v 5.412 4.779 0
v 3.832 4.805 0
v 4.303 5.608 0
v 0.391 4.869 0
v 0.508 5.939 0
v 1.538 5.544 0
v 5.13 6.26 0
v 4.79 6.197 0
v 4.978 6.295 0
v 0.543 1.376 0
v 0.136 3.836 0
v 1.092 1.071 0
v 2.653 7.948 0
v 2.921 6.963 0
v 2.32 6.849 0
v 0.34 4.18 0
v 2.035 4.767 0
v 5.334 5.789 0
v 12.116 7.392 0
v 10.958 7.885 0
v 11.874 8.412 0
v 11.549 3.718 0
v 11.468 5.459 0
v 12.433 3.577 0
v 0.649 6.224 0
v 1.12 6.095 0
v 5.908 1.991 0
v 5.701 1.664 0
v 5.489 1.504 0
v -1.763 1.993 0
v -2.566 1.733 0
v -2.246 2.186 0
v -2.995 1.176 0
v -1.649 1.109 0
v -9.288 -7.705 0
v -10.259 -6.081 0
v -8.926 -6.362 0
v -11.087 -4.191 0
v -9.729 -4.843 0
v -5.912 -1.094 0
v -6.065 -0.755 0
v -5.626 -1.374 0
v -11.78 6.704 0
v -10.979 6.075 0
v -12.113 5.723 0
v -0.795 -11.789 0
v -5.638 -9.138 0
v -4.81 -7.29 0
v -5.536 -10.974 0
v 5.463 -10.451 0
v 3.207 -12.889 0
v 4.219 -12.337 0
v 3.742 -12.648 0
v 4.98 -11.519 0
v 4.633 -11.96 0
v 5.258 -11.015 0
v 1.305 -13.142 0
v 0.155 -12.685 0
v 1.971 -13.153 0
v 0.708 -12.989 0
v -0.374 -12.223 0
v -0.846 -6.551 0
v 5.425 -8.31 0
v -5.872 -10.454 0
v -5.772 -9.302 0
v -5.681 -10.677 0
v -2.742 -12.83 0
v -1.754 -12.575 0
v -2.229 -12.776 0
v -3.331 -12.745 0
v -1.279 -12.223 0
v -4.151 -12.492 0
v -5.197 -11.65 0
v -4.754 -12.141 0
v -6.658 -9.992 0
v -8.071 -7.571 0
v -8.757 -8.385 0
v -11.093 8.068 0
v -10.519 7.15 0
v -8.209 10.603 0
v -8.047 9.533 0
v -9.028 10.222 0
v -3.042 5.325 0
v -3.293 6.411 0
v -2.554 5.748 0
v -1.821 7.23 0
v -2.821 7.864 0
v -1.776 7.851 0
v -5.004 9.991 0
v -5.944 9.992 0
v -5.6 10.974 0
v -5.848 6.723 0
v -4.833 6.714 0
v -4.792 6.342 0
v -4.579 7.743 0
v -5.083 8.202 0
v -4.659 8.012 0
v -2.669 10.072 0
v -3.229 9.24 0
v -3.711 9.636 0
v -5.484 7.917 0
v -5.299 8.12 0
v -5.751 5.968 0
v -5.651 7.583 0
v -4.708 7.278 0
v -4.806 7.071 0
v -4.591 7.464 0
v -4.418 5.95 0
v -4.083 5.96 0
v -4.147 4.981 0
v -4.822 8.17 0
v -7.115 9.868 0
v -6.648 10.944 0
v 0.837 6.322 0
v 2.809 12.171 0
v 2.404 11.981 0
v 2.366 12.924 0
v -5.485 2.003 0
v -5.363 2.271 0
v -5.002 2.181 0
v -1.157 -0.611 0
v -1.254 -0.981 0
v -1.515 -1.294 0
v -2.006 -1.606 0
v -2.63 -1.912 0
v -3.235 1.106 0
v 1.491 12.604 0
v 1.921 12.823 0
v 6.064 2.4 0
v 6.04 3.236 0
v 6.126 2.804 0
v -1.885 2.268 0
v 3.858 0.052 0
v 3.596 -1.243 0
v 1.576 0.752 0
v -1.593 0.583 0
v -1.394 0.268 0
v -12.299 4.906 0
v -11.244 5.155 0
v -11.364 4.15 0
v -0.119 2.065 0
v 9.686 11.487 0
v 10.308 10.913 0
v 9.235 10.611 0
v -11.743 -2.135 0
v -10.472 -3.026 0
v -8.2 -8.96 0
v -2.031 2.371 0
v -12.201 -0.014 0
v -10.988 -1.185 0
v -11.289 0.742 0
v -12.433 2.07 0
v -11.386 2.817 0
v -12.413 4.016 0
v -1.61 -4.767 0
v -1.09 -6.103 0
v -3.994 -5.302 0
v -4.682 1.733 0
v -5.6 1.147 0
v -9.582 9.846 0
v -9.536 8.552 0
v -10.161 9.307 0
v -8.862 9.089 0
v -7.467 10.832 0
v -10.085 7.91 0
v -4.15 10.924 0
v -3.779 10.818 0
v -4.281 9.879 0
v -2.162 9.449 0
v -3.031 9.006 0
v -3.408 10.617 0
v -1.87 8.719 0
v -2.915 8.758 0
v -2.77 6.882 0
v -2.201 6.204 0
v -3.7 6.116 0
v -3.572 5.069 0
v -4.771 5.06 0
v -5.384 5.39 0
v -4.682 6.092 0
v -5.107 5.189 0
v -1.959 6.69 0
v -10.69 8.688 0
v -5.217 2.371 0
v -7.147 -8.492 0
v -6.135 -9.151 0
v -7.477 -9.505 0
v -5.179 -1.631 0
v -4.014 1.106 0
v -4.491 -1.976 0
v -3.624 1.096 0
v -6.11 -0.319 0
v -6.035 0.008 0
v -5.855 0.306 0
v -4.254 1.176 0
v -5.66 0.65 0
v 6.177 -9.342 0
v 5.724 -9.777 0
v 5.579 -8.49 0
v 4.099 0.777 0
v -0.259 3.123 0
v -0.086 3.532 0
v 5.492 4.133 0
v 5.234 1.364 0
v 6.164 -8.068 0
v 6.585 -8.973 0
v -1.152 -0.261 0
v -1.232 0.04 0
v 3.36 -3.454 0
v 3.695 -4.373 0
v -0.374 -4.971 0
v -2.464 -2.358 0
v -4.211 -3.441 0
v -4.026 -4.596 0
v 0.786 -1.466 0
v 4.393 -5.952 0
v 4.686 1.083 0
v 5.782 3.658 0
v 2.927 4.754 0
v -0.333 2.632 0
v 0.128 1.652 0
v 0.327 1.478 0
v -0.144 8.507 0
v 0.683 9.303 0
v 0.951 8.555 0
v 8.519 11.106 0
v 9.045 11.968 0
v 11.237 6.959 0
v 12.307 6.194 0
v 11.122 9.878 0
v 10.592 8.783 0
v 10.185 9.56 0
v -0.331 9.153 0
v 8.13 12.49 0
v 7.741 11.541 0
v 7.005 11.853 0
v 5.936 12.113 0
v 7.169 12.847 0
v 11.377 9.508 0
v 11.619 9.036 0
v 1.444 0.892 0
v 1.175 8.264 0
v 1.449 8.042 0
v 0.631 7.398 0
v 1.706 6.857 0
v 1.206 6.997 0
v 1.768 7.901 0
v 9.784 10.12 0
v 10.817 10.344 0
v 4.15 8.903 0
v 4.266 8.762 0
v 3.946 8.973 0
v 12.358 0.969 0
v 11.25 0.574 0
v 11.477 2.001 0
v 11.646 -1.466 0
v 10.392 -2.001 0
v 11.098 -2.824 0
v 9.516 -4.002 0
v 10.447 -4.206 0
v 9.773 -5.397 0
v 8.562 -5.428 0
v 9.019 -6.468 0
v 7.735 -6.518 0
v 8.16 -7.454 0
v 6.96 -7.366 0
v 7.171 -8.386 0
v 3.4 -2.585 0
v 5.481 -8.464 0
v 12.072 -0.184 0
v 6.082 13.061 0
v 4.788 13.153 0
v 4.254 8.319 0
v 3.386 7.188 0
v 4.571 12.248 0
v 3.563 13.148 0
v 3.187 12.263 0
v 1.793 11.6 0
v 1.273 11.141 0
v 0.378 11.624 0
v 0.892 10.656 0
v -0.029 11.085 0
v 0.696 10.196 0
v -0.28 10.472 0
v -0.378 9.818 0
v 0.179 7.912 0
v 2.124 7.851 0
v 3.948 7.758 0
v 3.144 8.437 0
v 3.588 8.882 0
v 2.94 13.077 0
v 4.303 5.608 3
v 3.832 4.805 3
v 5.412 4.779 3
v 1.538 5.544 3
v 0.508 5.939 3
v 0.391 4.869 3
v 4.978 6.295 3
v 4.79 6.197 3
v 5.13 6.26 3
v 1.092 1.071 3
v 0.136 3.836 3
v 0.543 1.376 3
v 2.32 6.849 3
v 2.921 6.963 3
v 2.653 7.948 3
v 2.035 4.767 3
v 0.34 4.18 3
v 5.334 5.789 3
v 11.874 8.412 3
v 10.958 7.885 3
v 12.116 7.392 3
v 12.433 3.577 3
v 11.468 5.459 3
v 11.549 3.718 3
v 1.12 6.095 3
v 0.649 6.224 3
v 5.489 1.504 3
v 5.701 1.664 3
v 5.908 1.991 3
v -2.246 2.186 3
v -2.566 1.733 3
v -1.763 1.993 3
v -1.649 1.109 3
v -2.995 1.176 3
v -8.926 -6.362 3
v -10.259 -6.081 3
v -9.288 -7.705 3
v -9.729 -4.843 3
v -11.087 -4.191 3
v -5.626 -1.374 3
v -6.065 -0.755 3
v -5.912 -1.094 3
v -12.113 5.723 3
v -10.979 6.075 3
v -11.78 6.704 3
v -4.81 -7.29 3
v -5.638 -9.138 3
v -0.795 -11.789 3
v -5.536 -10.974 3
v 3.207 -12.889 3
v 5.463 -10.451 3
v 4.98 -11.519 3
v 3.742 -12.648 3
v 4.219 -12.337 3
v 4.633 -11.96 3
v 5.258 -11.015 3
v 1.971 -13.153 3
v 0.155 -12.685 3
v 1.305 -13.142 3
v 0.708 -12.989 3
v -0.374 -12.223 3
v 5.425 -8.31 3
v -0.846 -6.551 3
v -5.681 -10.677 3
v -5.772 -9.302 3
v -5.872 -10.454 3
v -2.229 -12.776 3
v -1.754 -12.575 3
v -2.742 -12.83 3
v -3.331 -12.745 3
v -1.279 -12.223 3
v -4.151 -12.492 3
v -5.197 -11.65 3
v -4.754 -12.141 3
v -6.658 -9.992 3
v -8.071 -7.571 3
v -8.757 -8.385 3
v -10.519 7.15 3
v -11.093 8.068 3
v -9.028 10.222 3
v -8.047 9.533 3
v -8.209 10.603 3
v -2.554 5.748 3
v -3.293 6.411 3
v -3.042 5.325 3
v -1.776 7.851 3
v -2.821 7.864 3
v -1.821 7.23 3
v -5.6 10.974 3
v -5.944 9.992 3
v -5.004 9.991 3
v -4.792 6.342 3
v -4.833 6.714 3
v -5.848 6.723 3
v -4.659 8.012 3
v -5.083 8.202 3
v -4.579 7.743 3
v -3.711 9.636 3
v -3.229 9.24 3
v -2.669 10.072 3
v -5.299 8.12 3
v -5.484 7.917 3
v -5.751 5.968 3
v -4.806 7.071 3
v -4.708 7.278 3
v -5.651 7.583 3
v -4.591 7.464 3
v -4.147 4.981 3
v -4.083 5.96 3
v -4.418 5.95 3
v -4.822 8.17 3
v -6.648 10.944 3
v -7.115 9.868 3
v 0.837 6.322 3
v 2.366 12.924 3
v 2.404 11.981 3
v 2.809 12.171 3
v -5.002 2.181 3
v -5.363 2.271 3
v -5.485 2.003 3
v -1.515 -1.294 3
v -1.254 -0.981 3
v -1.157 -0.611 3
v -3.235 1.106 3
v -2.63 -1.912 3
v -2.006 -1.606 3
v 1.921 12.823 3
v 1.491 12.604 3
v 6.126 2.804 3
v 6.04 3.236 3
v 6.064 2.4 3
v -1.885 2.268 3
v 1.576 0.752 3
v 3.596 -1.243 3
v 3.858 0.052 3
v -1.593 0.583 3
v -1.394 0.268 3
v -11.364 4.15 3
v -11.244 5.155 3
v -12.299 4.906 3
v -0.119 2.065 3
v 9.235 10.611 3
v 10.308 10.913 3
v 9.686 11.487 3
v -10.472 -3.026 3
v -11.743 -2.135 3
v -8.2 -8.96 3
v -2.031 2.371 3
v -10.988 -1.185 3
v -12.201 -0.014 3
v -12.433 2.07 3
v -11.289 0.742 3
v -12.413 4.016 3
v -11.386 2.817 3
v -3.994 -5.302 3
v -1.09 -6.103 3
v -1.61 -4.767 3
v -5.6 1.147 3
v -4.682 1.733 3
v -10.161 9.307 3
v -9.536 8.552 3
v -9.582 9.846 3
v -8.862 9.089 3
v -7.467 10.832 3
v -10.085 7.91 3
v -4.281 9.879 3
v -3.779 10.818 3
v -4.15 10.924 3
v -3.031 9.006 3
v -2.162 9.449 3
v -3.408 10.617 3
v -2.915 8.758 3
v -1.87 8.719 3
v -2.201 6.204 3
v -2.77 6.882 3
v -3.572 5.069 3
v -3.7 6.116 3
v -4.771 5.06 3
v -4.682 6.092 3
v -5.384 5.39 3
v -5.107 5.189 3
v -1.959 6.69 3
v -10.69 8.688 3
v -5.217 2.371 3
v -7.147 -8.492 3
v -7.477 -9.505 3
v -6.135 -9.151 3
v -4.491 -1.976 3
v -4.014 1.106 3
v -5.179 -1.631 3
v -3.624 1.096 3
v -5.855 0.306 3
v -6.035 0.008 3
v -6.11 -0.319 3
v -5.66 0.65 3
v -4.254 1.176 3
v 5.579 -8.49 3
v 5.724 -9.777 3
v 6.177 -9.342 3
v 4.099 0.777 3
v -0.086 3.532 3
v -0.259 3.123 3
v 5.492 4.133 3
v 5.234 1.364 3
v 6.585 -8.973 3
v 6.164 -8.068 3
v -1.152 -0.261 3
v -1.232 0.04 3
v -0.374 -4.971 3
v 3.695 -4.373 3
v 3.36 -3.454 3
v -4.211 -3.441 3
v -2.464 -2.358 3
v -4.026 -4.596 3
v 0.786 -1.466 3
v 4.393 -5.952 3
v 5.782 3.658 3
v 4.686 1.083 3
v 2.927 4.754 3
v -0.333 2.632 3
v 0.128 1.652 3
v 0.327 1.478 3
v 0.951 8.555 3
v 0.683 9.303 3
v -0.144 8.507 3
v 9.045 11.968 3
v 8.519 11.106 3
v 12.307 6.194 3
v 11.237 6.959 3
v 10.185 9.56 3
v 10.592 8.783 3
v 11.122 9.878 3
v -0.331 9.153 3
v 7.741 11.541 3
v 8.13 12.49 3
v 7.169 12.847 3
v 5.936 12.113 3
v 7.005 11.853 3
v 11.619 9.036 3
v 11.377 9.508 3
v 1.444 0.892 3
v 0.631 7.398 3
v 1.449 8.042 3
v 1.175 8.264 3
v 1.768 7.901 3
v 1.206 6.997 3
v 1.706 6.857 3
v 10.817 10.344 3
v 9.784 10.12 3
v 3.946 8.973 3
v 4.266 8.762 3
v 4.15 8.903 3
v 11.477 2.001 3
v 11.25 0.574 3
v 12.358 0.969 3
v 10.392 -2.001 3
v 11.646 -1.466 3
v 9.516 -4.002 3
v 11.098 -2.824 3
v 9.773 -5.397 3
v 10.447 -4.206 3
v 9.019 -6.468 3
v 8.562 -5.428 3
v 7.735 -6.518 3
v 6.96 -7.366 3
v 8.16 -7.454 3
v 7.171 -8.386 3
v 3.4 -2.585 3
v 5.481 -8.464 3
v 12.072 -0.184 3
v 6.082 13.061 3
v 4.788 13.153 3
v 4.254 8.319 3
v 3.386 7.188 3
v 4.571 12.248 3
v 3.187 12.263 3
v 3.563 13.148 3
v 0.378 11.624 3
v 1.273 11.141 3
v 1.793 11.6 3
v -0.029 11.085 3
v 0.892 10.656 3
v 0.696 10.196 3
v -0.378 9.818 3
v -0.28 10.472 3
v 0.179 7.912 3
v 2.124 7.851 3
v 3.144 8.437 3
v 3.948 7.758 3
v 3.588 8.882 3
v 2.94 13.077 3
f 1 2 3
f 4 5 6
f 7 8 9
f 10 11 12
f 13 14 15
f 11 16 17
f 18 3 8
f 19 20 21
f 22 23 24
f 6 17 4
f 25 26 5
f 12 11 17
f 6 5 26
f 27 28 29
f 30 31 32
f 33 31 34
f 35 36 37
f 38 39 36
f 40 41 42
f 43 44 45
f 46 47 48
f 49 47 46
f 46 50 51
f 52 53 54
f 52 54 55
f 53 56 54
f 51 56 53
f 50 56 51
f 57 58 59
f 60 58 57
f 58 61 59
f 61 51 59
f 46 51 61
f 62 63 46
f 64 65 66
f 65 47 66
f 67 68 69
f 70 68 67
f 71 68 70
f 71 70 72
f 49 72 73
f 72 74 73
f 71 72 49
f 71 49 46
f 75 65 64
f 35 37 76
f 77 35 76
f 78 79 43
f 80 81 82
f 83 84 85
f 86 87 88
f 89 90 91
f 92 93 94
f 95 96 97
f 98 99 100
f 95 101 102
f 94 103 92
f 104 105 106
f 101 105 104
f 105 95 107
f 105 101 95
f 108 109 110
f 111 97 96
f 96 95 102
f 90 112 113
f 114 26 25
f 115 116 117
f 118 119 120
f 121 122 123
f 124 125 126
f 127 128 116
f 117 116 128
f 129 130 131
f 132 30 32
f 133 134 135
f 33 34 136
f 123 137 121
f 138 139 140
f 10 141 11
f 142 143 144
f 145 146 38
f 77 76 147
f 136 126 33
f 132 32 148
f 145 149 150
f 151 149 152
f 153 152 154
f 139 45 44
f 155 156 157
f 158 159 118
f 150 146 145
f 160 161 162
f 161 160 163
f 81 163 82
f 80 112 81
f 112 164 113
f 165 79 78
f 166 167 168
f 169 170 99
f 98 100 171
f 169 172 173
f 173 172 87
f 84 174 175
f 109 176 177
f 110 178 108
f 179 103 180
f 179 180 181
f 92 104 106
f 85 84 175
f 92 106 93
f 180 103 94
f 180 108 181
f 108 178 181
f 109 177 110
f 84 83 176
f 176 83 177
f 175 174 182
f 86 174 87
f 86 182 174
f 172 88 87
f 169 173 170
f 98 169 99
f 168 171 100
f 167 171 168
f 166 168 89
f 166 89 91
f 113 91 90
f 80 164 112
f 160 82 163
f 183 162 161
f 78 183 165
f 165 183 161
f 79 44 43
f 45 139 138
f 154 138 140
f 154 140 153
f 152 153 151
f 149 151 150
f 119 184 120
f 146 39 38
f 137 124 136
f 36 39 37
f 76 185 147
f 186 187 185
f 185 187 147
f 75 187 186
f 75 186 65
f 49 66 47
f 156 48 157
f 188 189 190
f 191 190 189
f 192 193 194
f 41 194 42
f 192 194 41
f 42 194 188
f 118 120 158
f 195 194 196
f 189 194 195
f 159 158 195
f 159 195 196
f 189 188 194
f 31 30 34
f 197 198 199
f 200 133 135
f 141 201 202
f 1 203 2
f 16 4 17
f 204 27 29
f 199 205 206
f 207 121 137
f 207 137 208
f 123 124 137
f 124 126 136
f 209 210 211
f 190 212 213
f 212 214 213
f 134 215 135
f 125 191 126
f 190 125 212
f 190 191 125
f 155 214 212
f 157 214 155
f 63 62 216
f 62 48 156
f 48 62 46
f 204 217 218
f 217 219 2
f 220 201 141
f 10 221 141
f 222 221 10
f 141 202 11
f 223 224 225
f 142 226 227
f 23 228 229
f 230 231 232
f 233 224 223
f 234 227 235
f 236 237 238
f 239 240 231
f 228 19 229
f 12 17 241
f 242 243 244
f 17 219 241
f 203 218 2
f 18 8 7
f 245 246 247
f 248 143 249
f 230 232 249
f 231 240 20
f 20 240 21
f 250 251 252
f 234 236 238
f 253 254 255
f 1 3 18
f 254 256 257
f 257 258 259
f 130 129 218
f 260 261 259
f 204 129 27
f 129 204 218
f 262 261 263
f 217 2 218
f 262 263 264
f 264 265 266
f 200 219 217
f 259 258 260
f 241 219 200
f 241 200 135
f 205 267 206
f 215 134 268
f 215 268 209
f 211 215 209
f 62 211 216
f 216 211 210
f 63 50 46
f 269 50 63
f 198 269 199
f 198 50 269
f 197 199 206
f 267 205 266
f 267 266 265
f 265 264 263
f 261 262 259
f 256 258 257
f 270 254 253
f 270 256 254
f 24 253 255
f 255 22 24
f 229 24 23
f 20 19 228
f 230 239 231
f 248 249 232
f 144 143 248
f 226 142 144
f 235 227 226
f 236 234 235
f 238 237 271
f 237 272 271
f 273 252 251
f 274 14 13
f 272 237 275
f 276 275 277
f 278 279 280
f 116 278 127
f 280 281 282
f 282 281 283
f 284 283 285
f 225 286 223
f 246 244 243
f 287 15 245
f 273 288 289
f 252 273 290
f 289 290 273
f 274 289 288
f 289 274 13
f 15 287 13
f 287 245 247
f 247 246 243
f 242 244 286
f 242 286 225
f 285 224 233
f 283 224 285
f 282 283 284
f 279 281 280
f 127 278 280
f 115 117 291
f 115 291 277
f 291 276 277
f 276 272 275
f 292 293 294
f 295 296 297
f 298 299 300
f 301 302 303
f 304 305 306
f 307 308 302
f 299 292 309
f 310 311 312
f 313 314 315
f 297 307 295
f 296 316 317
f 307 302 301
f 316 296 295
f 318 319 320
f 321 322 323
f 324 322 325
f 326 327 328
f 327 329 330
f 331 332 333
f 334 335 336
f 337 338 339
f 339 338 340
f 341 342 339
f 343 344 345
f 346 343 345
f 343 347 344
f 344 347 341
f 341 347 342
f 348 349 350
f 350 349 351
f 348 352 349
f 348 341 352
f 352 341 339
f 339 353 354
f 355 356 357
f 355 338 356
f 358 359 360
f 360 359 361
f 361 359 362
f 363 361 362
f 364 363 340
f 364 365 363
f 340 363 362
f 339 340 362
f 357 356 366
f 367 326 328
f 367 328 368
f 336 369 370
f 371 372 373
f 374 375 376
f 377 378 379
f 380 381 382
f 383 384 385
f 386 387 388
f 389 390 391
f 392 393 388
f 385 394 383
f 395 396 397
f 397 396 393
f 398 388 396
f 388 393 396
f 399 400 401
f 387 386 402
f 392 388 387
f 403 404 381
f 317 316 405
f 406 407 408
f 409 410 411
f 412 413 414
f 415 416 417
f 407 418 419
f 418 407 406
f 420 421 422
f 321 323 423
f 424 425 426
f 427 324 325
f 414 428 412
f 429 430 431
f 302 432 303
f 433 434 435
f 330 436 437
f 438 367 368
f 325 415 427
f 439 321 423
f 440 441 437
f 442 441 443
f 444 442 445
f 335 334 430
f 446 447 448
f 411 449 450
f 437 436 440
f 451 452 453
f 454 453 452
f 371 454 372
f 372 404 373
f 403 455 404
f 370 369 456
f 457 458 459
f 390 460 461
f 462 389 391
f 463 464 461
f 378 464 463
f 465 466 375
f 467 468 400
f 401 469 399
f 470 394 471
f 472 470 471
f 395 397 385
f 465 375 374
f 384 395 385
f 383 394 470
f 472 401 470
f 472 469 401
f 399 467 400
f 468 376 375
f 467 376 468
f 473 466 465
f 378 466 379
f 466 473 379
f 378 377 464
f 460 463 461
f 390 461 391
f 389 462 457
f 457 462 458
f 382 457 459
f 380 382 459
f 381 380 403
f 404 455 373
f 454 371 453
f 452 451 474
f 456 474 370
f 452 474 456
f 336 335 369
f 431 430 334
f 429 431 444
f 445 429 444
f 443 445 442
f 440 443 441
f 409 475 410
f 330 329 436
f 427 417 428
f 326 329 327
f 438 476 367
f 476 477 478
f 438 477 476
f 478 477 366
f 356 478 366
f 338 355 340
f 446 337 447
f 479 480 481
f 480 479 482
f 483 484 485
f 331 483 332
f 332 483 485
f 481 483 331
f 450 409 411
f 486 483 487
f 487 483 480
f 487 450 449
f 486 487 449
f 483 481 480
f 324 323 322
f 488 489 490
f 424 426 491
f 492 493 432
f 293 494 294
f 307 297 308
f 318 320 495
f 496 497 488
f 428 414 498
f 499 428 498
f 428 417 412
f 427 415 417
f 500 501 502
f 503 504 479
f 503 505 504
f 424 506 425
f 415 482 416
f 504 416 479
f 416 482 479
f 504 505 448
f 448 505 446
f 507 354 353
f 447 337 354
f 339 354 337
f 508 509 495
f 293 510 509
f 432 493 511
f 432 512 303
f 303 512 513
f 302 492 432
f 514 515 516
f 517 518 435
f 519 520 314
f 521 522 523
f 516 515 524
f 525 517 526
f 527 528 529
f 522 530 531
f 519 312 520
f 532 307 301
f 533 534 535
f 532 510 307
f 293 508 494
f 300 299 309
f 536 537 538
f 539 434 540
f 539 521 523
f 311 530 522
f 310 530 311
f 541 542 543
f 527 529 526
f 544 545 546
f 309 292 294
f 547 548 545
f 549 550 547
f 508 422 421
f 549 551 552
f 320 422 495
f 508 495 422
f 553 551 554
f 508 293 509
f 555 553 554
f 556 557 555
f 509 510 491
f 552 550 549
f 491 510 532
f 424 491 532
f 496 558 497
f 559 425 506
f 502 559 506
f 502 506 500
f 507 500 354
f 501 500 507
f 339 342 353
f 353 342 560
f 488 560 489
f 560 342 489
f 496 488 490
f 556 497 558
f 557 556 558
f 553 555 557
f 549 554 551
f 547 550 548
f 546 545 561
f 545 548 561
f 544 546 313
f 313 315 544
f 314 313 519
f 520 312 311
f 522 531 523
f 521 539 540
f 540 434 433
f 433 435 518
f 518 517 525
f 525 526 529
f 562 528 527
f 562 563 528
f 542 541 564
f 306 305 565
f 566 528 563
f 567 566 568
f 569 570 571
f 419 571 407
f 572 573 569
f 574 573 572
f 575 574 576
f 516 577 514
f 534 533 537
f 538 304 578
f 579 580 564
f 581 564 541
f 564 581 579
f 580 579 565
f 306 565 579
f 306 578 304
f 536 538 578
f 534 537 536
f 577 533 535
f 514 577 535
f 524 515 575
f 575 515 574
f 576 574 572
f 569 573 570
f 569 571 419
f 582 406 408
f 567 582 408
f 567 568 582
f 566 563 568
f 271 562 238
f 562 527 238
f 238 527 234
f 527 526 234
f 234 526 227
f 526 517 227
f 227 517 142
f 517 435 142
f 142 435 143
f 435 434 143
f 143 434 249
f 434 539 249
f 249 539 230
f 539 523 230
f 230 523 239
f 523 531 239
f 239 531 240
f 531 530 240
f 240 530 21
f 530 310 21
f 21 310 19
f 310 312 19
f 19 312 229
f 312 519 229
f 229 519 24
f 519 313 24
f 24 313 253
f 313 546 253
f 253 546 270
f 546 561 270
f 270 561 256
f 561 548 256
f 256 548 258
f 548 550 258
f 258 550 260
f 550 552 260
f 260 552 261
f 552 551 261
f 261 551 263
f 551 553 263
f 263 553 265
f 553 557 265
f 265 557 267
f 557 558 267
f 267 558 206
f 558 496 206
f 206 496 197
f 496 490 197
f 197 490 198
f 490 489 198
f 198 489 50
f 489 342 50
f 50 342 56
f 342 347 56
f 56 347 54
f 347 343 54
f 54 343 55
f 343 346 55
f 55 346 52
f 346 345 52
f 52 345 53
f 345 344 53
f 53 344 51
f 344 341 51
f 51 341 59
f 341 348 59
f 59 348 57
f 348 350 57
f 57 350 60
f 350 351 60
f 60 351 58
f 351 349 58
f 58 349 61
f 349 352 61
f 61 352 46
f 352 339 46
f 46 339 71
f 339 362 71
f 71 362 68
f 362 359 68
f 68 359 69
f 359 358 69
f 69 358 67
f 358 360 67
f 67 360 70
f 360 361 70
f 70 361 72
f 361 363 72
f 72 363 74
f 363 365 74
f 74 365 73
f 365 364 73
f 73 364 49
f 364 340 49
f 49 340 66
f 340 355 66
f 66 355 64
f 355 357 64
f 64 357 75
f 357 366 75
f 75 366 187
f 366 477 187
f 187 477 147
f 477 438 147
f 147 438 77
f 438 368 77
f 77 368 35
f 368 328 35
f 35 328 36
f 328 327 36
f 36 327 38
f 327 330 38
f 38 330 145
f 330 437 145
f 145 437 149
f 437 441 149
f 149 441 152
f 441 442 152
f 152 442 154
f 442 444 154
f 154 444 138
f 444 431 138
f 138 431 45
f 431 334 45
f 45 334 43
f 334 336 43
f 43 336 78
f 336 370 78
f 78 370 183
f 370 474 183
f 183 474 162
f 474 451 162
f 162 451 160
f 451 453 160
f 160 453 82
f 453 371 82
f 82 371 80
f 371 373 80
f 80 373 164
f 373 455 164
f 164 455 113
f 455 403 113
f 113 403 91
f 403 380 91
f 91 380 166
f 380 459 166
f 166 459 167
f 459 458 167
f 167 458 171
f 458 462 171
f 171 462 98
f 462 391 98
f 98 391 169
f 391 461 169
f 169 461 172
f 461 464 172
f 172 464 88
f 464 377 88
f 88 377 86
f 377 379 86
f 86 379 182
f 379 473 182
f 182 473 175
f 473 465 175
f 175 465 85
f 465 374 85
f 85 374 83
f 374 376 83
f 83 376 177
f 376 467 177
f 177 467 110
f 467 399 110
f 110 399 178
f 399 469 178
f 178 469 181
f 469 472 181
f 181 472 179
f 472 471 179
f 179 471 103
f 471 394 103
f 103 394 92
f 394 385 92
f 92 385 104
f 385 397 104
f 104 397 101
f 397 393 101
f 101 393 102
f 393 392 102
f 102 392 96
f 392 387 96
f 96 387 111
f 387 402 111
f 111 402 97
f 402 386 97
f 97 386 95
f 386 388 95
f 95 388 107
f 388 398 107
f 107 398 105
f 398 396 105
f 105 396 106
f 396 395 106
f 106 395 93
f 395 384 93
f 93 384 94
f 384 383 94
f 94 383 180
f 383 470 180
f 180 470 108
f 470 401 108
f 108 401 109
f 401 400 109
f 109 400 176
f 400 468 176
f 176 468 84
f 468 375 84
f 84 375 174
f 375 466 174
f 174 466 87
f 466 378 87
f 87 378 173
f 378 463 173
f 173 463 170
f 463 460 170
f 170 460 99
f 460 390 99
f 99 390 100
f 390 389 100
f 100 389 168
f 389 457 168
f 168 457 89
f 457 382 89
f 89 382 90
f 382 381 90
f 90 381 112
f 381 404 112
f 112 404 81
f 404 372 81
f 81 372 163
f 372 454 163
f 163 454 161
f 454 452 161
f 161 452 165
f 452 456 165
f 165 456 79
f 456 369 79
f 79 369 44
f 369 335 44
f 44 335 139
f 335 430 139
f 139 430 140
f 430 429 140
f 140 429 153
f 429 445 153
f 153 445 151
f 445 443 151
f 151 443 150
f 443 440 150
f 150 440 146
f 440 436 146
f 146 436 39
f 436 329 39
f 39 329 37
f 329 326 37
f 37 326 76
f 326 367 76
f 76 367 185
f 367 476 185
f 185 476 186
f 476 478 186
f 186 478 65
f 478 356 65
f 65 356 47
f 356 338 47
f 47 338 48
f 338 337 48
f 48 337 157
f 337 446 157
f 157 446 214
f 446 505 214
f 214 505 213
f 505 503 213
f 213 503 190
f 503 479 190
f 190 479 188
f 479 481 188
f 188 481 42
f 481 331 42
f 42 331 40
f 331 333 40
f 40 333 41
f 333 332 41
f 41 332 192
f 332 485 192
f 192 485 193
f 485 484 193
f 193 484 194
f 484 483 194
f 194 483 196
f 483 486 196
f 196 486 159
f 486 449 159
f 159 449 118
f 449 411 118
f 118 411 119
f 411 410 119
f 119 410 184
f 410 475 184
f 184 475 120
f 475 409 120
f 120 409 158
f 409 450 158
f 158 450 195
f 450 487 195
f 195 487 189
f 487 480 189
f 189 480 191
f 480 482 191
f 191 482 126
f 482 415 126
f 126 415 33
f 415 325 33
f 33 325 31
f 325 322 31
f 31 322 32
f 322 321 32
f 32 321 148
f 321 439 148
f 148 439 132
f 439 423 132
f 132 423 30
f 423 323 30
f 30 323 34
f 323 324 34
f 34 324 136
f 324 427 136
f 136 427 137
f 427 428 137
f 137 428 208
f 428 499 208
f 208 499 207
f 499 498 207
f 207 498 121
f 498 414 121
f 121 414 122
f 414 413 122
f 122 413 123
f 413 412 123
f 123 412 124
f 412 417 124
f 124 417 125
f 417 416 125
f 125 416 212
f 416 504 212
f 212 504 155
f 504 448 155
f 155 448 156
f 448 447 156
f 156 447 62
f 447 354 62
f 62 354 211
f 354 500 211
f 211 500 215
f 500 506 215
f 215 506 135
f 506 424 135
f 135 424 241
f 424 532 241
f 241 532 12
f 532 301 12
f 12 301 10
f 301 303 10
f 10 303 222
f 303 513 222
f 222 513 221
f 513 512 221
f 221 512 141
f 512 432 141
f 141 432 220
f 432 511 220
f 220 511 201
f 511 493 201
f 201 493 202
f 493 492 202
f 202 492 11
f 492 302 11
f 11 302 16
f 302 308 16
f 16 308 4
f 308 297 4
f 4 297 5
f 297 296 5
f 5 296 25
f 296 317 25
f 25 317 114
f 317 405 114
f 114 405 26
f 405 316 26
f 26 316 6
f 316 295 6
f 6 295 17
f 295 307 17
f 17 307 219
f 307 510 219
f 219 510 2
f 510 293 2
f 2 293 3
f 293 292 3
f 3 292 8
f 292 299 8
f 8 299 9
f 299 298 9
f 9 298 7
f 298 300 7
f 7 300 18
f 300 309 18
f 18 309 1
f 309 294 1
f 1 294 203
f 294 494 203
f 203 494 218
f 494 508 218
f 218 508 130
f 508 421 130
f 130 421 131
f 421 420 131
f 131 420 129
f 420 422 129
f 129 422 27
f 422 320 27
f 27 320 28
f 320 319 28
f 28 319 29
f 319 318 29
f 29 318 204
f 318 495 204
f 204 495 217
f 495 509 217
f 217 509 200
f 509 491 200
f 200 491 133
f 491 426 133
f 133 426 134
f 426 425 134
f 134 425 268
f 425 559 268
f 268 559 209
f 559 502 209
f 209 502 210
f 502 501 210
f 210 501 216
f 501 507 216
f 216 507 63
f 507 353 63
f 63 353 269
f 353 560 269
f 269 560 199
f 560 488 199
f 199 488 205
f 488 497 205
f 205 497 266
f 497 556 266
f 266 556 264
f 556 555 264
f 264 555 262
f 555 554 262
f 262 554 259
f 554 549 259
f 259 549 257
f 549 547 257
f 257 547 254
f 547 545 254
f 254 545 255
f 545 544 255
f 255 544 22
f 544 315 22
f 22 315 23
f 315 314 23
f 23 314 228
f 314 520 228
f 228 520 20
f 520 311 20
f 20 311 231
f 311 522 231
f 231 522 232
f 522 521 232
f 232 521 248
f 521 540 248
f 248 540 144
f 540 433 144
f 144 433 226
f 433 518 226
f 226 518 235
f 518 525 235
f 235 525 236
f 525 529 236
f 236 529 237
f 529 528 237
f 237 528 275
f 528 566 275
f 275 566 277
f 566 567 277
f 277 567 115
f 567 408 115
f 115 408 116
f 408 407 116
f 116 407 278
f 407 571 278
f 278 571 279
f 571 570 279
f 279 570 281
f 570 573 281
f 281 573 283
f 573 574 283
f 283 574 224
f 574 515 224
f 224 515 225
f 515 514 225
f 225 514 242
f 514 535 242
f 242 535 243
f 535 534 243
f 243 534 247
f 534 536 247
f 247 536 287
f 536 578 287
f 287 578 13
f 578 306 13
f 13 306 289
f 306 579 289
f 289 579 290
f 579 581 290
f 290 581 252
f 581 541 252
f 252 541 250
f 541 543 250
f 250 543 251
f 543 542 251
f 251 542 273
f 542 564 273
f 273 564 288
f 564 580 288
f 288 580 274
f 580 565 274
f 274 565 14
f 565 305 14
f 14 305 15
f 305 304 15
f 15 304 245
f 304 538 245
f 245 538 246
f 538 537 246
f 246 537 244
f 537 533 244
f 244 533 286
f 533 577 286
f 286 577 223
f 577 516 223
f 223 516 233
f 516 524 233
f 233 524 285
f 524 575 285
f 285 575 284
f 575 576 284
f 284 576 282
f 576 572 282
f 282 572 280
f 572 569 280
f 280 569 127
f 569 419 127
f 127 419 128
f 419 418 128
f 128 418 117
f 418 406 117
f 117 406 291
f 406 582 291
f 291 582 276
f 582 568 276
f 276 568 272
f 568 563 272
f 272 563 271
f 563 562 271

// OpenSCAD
// Module names are of the form poly_<inkscape-path-id>().  As a result,
// you can associate a polygon in this OpenSCAD program with the corresponding
// SVG element in the Inkscape document by looking for the XML element with
// the attribute id="inkscape-path-id".

// fudge value is used to ensure that subtracted solids are a tad taller
// in the z dimension than the polygon being subtracted from.  This helps
// keep the resulting .stl file manifold.
fudge = 0.1;

module poly_path8(h)
{
  scale([25.4/90, -25.4/90, 1]) union()
  {
    linear_extrude(height=h)
      polygon([[10.415846,-46.334673],[8.383623,-45.792747],[6.806534,-45.434991],[5.284484,-44.658089],[1.338585,-41.186376],[-0.104169,-39.276140],[-0.990708,-37.107113],[-1.340614,-34.788844],[-1.173467,-32.430884],[-0.508849,-30.142781],[0.633658,-28.034086],[2.234475,-26.214347],[4.274018,-24.793115],[6.045862,-24.295643],[8.219917,-24.268124],[10.351633,-24.672451],[11.996463,-25.470522],[13.989876,-27.487221],[15.073023,-29.478516],[15.114655,-31.046432],[14.703888,-31.547255],[13.983525,-31.792992],[12.713386,-31.471223],[11.138414,-29.896251],[9.399735,-28.163217],[7.525574,-27.818868],[6.263550,-27.994394],[5.134890,-28.494864],[4.162881,-29.281116],[3.370808,-30.313986],[2.419615,-32.962931],[2.467598,-36.128400],[3.159118,-37.757706],[4.511111,-39.475922],[6.354223,-41.100994],[8.519105,-42.450870],[9.953656,-43.126161],[11.290831,-43.450046],[16.196390,-43.399241],[21.034209,-42.919410],[24.822045,-41.999265],[27.427242,-40.893538],[30.184855,-39.351731],[32.722310,-37.598233],[34.667034,-35.857437],[36.087473,-33.872492],[37.529081,-31.121230],[38.826740,-27.938120],[39.815331,-24.657633],[40.635277,-19.344218],[40.921764,-13.175576],[40.666325,-7.091610],[39.860492,-2.032223],[36.823448,7.090198],[33.718664,14.180397],[30.338683,19.232022],[27.407484,23.093951],[24.662572,26.100652],[21.841452,28.586596],[19.769715,30.082538],[19.421838,29.990100],[19.222143,29.444646],[15.564143,21.089953],[13.091606,15.495697],[11.906142,12.238495],[12.048680,9.159114],[12.741612,4.403149],[13.671636,-0.183465],[14.525451,-2.754790],[16.602834,-3.838642],[18.544736,-4.832174],[19.447946,-5.328939],[20.200856,-5.896268],[20.932597,-7.056328],[21.486519,-8.504287],[21.705971,-9.935310],[21.401138,-11.465122],[20.486637,-12.961064],[19.459236,-14.643292],[19.176983,-16.935187],[18.899669,-20.512040],[18.177807,-22.179451],[17.638262,-22.303730],[16.973292,-21.958587],[15.248019,-19.870620],[13.577081,-17.025509],[10.370685,-16.844866],[7.209450,-16.890027],[5.448191,-19.644818],[3.969185,-21.598009],[2.964363,-22.399608],[2.298246,-22.052437],[1.801481,-21.044793],[1.383746,-17.251311],[1.203104,-14.812644],[0.480536,-13.593311],[-0.304128,-12.515104],[-0.919440,-11.064323],[-1.179112,-9.325643],[-0.422674,-7.316001],[0.452311,-5.853930],[1.157943,-5.238618],[1.925672,-4.877334],[3.867573,-3.793482],[5.115132,-3.161235],[5.583672,-2.664470],[2.783721,5.193458],[-1.325884,17.612595],[-2.996823,23.212497],[-3.860517,21.626234],[-5.706453,16.890027],[-8.732206,8.354692],[-9.319293,6.774075],[-7.106428,5.690223],[-5.367749,4.583791],[-4.441959,3.477359],[-4.100432,2.163470],[-4.080675,0.925790],[-4.365750,-0.142538],[-4.938724,-0.948371],[-5.644357,-2.066093],[-5.841934,-3.928964],[-6.248379,-7.061973],[-6.680226,-8.037863],[-7.196749,-8.399853],[-7.958832,-7.745026],[-9.093490,-6.141828],[-10.612012,-4.166056],[-11.462299,-3.919085],[-12.841812,-3.883803],[-14.221324,-3.919085],[-15.071611,-4.166056],[-16.590133,-6.141828],[-17.724791,-7.728091],[-18.486874,-8.399853],[-19.003397,-8.046331],[-19.435245,-7.095844],[-19.841689,-4.064445],[-20.056201,-2.303186],[-20.744899,-1.083852],[-21.382791,-0.028225],[-21.648109,1.129012],[-21.488636,2.675054],[-20.948121,3.878158],[-19.933421,4.869572],[-18.351393,5.780544],[-15.912726,6.999877],[-14.919195,12.193335],[-14.264367,16.286005],[-14.151466,18.786768],[-17.041738,25.831806],[-19.977171,32.380078],[-20.451356,32.961520],[-21.738430,32.425239],[-25.322339,30.091006],[-28.597181,26.825337],[-31.626463,22.543557],[-34.473691,17.160990],[-37.105701,10.722796],[-38.933290,4.199927],[-39.998796,-2.627777],[-40.344556,-9.980471],[-40.264820,-14.703977],[-39.842145,-18.267422],[-38.902948,-21.526035],[-37.273642,-25.335041],[-35.733246,-28.026324],[-33.790638,-30.302696],[-31.399249,-32.206493],[-28.512505,-33.780054],[-25.210143,-34.965517],[-21.061023,-35.405832],[-17.729024,-35.402304],[-15.167577,-35.005033],[-13.148056,-34.142044],[-11.441836,-32.741363],[-10.739731,-31.909421],[-10.329759,-31.030909],[-9.996700,-27.864029],[-9.816058,-24.386670],[-11.667639,-22.715732],[-13.109952,-21.669278],[-14.467590,-21.118179],[-15.655875,-21.083603],[-16.590133,-21.586719],[-16.978937,-22.471583],[-17.126414,-23.788293],[-17.028331,-25.054199],[-16.680454,-25.786646],[-16.267659,-26.445707],[-16.223204,-27.435004],[-16.508985,-28.390431],[-17.086899,-28.947880],[-18.009161,-29.061487],[-18.774772,-28.772884],[-19.430305,-28.052432],[-20.022331,-26.870497],[-20.723024,-23.822164],[-20.377970,-21.146404],[-19.076077,-19.097246],[-18.094101,-18.387027],[-16.906257,-17.928719],[-14.694098,-17.649288],[-12.655524,-17.962589],[-10.777836,-18.868621],[-9.048330,-20.367385],[-7.798654,-21.982579],[-6.942721,-23.703617],[-6.450895,-25.619411],[-6.293539,-27.818868],[-6.625186,-30.893310],[-7.659644,-33.480866],[-9.456185,-35.687379],[-12.074083,-37.618696],[-13.389383,-38.330680],[-14.704682,-38.708194],[-19.841689,-38.883190],[-23.556140,-38.778051],[-26.457702,-38.380780],[-29.088301,-37.568597],[-31.989864,-36.218721],[-33.952228,-34.886486],[-36.003503,-32.978455],[-37.876958,-30.782526],[-39.305865,-28.586596],[-41.738886,-23.754423],[-42.918705,-20.277065],[-43.580654,-17.381743],[-43.982622,-14.229615],[-44.054773,-7.334347],[-43.231476,0.049924],[-41.609050,7.564384],[-39.283814,14.850219],[-36.352086,21.548615],[-32.910185,27.300757],[-31.028020,29.709854],[-29.054431,31.747831],[-26.491573,33.678443],[-23.590011,35.405832],[-20.806995,37.042900],[-20.128882,37.831798],[-19.615887,38.883190],[-18.414194,41.280225],[-16.844161,43.021021],[-14.706799,44.262229],[-11.803120,45.160500],[-9.714447,45.461805],[-7.896737,45.267756],[-6.214508,44.557184],[-4.532280,43.308920],[-2.816181,41.773462],[-1.325884,43.308920],[0.550394,44.948105],[2.507113,46.024195],[4.624717,46.566826],[6.983648,46.605636],[11.362100,45.668556],[13.260516,44.814740],[14.948831,43.715364],[16.414872,42.378895],[17.646465,40.813802],[18.631441,39.028551],[19.357625,37.031610],[20.283415,34.643749],[21.886613,33.102646],[23.331749,31.792992],[25.409132,29.715609],[28.911893,26.410425],[31.957404,22.918954],[34.630342,19.122649],[37.015380,14.902965],[39.324917,10.005873],[41.266113,5.193458],[42.775461,0.652005],[43.789455,-3.432198],[44.054773,-12.673165],[43.608813,-21.948003],[42.931406,-26.193090],[42.073356,-29.805930],[41.170146,-32.018794],[40.312097,-33.689733],[39.408887,-34.999387],[38.328563,-36.651980],[36.524260,-38.668678],[34.321980,-40.702312],[32.047725,-42.405710],[28.808165,-44.255879],[25.403487,-45.521784],[21.550026,-46.279634],[16.964118,-46.605636],[12.623065,-46.588701],[10.415846,-46.334673]]);
  }
}

module gato4(h)
{

poly_path8(h);
}

gato4(3);
